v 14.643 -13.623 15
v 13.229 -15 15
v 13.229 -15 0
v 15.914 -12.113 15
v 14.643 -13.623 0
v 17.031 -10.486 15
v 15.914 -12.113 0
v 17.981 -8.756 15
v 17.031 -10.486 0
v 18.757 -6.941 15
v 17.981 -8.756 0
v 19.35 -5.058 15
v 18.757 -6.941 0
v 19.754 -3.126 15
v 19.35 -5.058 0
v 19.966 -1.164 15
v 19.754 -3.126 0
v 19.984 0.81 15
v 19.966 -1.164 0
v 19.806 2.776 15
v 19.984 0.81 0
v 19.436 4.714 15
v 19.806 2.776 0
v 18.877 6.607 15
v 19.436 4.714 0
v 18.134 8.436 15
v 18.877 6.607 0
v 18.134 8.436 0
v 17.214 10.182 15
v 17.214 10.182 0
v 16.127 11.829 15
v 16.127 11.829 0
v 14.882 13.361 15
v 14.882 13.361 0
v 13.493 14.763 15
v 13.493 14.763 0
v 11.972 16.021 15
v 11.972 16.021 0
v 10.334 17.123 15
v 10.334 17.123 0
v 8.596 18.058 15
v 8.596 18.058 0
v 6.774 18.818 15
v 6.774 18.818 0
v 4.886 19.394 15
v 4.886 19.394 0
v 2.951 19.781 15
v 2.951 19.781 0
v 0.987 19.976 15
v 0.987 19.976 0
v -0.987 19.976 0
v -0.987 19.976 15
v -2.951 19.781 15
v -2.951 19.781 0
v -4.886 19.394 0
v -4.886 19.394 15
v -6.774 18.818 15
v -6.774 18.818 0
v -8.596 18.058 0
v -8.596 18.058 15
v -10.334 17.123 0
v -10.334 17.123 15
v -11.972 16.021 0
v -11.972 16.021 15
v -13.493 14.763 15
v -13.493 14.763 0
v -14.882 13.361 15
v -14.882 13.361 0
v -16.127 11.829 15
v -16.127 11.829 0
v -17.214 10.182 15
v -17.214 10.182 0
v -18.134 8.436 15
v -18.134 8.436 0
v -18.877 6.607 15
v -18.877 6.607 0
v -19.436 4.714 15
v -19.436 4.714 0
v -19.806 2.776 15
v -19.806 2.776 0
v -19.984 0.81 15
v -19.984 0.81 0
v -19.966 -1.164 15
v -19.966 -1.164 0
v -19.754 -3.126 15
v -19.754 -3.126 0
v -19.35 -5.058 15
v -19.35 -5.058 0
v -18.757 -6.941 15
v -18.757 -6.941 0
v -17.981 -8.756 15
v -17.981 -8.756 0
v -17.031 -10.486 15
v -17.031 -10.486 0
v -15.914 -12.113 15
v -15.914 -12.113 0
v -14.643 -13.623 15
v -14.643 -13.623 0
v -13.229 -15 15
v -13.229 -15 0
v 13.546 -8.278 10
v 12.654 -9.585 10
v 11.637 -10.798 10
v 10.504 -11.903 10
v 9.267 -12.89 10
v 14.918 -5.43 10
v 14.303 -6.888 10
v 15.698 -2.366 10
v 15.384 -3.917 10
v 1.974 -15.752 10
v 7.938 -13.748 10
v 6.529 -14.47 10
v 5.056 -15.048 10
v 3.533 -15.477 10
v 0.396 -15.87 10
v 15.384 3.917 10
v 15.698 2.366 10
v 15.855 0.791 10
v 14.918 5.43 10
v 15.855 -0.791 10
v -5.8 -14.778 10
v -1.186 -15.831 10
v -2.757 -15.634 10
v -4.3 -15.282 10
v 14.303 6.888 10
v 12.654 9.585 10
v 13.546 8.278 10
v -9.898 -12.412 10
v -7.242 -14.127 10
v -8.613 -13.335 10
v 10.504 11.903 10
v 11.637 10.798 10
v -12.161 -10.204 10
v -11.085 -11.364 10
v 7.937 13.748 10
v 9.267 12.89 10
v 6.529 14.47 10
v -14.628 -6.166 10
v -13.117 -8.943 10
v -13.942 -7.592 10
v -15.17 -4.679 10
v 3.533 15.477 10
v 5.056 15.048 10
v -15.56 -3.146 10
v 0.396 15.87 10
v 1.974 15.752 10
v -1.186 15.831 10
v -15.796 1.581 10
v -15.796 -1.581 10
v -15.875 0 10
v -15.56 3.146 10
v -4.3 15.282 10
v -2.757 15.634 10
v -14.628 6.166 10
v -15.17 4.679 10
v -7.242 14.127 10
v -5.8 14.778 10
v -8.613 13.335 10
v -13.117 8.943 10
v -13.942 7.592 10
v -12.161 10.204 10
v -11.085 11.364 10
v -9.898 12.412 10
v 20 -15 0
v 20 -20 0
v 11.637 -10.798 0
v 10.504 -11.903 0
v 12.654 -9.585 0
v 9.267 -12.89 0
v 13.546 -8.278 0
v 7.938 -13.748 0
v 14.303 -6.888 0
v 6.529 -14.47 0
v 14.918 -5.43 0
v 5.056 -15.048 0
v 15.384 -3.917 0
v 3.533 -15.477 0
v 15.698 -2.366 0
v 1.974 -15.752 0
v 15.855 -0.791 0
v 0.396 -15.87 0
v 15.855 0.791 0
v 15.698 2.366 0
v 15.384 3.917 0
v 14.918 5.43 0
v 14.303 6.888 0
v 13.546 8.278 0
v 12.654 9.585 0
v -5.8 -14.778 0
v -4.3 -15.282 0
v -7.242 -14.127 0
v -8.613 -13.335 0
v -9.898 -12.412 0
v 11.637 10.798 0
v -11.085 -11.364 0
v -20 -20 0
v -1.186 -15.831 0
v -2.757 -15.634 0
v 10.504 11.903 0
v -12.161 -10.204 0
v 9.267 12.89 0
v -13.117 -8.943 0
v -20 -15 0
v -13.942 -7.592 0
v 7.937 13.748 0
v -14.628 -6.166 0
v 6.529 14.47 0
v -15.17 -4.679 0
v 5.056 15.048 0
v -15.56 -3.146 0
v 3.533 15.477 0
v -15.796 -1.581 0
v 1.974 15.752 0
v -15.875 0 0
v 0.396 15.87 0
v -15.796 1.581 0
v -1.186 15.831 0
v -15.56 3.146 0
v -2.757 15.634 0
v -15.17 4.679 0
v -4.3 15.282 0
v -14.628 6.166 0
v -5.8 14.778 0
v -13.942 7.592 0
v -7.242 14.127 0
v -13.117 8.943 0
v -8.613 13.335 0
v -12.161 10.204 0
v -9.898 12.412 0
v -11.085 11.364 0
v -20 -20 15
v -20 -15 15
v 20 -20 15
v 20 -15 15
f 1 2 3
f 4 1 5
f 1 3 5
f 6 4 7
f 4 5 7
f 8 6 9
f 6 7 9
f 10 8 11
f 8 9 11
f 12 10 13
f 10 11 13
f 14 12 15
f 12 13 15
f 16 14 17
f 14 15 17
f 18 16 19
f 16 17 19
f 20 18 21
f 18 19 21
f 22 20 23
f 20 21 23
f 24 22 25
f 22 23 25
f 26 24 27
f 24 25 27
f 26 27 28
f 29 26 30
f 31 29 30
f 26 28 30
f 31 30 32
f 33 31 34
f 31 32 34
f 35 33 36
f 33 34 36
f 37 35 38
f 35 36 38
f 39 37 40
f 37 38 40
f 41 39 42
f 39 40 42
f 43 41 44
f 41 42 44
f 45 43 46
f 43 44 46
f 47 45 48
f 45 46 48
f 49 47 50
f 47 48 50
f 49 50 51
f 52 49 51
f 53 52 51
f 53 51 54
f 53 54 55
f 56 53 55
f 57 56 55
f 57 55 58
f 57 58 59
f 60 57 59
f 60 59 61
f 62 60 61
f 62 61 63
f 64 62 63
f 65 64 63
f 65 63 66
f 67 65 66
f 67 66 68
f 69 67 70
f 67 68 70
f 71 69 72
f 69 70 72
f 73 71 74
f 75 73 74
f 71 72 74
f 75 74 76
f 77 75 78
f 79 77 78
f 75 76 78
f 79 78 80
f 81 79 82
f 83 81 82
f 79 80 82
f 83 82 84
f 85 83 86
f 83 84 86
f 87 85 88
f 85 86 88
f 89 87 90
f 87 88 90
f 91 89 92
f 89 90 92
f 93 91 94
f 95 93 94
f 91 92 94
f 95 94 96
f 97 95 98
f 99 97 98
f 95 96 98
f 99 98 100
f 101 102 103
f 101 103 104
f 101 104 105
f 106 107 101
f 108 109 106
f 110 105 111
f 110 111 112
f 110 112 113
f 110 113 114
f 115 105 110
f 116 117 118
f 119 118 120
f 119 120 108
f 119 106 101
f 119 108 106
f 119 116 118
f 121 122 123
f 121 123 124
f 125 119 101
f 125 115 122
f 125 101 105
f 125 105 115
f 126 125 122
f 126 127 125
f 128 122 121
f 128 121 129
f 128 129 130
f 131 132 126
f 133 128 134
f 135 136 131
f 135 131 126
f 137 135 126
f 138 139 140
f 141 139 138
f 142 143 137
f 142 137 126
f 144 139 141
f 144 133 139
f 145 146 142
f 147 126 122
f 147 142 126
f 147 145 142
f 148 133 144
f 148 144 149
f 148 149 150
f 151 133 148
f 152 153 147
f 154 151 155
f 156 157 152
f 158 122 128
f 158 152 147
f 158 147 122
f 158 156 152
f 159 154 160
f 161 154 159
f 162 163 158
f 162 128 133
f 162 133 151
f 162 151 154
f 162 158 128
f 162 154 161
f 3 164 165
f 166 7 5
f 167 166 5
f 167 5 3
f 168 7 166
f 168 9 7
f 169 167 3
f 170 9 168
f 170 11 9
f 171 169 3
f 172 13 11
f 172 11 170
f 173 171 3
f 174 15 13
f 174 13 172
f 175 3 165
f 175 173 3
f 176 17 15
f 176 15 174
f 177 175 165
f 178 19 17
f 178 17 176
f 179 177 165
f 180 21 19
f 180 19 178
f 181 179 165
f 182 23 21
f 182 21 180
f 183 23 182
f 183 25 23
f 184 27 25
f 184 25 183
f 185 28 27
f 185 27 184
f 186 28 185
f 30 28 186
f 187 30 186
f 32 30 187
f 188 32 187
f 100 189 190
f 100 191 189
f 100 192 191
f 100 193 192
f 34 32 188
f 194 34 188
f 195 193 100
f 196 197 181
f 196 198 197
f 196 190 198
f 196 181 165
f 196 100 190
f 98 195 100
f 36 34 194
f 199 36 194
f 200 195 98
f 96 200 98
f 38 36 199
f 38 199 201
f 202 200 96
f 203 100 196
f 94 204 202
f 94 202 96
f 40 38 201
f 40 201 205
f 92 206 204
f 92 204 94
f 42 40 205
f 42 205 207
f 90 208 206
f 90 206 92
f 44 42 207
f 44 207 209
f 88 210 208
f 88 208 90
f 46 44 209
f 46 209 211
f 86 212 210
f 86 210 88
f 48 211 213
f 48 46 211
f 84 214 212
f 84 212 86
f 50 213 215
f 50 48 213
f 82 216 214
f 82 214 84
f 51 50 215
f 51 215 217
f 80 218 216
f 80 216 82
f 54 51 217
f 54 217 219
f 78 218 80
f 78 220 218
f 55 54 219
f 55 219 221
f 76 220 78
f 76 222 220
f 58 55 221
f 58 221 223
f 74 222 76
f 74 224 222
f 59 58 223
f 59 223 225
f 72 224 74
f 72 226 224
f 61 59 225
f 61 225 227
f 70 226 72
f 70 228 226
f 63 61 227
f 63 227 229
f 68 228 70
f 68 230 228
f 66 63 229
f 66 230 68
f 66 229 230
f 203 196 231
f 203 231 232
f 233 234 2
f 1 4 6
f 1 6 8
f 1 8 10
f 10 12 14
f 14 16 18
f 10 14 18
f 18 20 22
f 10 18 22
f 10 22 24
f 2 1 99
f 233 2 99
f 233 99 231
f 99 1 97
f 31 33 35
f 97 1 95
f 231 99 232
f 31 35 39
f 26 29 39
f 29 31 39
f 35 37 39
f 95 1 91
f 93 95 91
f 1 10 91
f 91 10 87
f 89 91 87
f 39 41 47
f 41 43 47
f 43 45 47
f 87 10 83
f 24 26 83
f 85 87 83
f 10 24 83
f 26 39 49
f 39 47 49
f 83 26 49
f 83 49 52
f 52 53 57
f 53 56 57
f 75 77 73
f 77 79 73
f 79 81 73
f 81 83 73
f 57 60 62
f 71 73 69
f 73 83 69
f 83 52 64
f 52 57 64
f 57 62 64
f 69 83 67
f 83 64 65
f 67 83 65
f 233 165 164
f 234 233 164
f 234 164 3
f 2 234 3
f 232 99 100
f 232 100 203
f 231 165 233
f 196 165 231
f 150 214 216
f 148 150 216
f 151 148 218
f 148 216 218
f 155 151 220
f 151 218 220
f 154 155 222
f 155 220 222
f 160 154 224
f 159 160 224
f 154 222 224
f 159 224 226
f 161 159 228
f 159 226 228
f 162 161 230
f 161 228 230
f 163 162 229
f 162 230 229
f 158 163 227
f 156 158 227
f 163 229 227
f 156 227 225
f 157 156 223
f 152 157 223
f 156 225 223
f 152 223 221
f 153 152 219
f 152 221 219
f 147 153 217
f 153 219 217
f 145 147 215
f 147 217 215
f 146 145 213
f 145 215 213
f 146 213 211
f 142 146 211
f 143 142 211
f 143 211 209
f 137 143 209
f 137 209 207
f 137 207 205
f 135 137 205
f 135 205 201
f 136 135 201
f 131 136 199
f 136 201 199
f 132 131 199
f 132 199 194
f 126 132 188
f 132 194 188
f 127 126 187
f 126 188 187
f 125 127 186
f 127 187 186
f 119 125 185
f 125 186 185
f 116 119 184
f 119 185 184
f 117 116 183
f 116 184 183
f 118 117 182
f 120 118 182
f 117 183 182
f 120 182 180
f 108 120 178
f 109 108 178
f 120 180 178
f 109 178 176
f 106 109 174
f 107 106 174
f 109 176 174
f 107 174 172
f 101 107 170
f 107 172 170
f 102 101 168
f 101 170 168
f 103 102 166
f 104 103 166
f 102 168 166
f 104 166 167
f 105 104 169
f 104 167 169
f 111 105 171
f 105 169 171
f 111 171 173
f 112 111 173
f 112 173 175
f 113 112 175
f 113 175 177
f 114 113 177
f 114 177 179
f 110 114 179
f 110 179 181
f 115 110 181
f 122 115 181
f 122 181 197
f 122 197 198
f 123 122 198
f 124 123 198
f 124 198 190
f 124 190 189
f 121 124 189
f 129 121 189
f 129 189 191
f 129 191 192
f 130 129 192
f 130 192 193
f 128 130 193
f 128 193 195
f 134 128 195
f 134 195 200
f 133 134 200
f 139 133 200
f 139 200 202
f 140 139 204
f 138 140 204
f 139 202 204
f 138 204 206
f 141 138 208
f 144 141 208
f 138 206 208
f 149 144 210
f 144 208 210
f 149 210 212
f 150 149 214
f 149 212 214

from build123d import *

# Parameters (mm, degrees)
SKETCH1_R           = 20
BOSS_EXTRUDE1_DEPTH = 15
SKETCH2_W           = 40
SKETCH2_H           = 5
BOSS_EXTRUDE2_DEPTH = 15
SKETCH3_R           = 15.875
CUT_EXTRUDE1_DEPTH  = 10


with BuildPart() as part:
    # Sketch1 → Boss-Extrude1 (new body)
    with BuildSketch(Plane.XY):
        Circle(SKETCH1_R)
    extrude(amount=BOSS_EXTRUDE1_DEPTH)

    # Sketch2 → Boss-Extrude2 (add)
    with BuildSketch(Plane(origin=(0, 0, 0), x_dir=(-1, 0, 0), z_dir=(0, 0, -1))):
        with Locations((0, -17.5)):
            Rectangle(SKETCH2_W, SKETCH2_H)
    extrude(amount=-BOSS_EXTRUDE2_DEPTH)

    # Sketch3 → Cut-Extrude1 (cut)
    with BuildSketch(Plane(origin=(0, 0, 0), x_dir=(-1, 0, 0), z_dir=(0, 0, -1))):
        Circle(SKETCH3_R)
    extrude(amount=-CUT_EXTRUDE1_DEPTH, mode=Mode.SUBTRACT)


solid = part.part
